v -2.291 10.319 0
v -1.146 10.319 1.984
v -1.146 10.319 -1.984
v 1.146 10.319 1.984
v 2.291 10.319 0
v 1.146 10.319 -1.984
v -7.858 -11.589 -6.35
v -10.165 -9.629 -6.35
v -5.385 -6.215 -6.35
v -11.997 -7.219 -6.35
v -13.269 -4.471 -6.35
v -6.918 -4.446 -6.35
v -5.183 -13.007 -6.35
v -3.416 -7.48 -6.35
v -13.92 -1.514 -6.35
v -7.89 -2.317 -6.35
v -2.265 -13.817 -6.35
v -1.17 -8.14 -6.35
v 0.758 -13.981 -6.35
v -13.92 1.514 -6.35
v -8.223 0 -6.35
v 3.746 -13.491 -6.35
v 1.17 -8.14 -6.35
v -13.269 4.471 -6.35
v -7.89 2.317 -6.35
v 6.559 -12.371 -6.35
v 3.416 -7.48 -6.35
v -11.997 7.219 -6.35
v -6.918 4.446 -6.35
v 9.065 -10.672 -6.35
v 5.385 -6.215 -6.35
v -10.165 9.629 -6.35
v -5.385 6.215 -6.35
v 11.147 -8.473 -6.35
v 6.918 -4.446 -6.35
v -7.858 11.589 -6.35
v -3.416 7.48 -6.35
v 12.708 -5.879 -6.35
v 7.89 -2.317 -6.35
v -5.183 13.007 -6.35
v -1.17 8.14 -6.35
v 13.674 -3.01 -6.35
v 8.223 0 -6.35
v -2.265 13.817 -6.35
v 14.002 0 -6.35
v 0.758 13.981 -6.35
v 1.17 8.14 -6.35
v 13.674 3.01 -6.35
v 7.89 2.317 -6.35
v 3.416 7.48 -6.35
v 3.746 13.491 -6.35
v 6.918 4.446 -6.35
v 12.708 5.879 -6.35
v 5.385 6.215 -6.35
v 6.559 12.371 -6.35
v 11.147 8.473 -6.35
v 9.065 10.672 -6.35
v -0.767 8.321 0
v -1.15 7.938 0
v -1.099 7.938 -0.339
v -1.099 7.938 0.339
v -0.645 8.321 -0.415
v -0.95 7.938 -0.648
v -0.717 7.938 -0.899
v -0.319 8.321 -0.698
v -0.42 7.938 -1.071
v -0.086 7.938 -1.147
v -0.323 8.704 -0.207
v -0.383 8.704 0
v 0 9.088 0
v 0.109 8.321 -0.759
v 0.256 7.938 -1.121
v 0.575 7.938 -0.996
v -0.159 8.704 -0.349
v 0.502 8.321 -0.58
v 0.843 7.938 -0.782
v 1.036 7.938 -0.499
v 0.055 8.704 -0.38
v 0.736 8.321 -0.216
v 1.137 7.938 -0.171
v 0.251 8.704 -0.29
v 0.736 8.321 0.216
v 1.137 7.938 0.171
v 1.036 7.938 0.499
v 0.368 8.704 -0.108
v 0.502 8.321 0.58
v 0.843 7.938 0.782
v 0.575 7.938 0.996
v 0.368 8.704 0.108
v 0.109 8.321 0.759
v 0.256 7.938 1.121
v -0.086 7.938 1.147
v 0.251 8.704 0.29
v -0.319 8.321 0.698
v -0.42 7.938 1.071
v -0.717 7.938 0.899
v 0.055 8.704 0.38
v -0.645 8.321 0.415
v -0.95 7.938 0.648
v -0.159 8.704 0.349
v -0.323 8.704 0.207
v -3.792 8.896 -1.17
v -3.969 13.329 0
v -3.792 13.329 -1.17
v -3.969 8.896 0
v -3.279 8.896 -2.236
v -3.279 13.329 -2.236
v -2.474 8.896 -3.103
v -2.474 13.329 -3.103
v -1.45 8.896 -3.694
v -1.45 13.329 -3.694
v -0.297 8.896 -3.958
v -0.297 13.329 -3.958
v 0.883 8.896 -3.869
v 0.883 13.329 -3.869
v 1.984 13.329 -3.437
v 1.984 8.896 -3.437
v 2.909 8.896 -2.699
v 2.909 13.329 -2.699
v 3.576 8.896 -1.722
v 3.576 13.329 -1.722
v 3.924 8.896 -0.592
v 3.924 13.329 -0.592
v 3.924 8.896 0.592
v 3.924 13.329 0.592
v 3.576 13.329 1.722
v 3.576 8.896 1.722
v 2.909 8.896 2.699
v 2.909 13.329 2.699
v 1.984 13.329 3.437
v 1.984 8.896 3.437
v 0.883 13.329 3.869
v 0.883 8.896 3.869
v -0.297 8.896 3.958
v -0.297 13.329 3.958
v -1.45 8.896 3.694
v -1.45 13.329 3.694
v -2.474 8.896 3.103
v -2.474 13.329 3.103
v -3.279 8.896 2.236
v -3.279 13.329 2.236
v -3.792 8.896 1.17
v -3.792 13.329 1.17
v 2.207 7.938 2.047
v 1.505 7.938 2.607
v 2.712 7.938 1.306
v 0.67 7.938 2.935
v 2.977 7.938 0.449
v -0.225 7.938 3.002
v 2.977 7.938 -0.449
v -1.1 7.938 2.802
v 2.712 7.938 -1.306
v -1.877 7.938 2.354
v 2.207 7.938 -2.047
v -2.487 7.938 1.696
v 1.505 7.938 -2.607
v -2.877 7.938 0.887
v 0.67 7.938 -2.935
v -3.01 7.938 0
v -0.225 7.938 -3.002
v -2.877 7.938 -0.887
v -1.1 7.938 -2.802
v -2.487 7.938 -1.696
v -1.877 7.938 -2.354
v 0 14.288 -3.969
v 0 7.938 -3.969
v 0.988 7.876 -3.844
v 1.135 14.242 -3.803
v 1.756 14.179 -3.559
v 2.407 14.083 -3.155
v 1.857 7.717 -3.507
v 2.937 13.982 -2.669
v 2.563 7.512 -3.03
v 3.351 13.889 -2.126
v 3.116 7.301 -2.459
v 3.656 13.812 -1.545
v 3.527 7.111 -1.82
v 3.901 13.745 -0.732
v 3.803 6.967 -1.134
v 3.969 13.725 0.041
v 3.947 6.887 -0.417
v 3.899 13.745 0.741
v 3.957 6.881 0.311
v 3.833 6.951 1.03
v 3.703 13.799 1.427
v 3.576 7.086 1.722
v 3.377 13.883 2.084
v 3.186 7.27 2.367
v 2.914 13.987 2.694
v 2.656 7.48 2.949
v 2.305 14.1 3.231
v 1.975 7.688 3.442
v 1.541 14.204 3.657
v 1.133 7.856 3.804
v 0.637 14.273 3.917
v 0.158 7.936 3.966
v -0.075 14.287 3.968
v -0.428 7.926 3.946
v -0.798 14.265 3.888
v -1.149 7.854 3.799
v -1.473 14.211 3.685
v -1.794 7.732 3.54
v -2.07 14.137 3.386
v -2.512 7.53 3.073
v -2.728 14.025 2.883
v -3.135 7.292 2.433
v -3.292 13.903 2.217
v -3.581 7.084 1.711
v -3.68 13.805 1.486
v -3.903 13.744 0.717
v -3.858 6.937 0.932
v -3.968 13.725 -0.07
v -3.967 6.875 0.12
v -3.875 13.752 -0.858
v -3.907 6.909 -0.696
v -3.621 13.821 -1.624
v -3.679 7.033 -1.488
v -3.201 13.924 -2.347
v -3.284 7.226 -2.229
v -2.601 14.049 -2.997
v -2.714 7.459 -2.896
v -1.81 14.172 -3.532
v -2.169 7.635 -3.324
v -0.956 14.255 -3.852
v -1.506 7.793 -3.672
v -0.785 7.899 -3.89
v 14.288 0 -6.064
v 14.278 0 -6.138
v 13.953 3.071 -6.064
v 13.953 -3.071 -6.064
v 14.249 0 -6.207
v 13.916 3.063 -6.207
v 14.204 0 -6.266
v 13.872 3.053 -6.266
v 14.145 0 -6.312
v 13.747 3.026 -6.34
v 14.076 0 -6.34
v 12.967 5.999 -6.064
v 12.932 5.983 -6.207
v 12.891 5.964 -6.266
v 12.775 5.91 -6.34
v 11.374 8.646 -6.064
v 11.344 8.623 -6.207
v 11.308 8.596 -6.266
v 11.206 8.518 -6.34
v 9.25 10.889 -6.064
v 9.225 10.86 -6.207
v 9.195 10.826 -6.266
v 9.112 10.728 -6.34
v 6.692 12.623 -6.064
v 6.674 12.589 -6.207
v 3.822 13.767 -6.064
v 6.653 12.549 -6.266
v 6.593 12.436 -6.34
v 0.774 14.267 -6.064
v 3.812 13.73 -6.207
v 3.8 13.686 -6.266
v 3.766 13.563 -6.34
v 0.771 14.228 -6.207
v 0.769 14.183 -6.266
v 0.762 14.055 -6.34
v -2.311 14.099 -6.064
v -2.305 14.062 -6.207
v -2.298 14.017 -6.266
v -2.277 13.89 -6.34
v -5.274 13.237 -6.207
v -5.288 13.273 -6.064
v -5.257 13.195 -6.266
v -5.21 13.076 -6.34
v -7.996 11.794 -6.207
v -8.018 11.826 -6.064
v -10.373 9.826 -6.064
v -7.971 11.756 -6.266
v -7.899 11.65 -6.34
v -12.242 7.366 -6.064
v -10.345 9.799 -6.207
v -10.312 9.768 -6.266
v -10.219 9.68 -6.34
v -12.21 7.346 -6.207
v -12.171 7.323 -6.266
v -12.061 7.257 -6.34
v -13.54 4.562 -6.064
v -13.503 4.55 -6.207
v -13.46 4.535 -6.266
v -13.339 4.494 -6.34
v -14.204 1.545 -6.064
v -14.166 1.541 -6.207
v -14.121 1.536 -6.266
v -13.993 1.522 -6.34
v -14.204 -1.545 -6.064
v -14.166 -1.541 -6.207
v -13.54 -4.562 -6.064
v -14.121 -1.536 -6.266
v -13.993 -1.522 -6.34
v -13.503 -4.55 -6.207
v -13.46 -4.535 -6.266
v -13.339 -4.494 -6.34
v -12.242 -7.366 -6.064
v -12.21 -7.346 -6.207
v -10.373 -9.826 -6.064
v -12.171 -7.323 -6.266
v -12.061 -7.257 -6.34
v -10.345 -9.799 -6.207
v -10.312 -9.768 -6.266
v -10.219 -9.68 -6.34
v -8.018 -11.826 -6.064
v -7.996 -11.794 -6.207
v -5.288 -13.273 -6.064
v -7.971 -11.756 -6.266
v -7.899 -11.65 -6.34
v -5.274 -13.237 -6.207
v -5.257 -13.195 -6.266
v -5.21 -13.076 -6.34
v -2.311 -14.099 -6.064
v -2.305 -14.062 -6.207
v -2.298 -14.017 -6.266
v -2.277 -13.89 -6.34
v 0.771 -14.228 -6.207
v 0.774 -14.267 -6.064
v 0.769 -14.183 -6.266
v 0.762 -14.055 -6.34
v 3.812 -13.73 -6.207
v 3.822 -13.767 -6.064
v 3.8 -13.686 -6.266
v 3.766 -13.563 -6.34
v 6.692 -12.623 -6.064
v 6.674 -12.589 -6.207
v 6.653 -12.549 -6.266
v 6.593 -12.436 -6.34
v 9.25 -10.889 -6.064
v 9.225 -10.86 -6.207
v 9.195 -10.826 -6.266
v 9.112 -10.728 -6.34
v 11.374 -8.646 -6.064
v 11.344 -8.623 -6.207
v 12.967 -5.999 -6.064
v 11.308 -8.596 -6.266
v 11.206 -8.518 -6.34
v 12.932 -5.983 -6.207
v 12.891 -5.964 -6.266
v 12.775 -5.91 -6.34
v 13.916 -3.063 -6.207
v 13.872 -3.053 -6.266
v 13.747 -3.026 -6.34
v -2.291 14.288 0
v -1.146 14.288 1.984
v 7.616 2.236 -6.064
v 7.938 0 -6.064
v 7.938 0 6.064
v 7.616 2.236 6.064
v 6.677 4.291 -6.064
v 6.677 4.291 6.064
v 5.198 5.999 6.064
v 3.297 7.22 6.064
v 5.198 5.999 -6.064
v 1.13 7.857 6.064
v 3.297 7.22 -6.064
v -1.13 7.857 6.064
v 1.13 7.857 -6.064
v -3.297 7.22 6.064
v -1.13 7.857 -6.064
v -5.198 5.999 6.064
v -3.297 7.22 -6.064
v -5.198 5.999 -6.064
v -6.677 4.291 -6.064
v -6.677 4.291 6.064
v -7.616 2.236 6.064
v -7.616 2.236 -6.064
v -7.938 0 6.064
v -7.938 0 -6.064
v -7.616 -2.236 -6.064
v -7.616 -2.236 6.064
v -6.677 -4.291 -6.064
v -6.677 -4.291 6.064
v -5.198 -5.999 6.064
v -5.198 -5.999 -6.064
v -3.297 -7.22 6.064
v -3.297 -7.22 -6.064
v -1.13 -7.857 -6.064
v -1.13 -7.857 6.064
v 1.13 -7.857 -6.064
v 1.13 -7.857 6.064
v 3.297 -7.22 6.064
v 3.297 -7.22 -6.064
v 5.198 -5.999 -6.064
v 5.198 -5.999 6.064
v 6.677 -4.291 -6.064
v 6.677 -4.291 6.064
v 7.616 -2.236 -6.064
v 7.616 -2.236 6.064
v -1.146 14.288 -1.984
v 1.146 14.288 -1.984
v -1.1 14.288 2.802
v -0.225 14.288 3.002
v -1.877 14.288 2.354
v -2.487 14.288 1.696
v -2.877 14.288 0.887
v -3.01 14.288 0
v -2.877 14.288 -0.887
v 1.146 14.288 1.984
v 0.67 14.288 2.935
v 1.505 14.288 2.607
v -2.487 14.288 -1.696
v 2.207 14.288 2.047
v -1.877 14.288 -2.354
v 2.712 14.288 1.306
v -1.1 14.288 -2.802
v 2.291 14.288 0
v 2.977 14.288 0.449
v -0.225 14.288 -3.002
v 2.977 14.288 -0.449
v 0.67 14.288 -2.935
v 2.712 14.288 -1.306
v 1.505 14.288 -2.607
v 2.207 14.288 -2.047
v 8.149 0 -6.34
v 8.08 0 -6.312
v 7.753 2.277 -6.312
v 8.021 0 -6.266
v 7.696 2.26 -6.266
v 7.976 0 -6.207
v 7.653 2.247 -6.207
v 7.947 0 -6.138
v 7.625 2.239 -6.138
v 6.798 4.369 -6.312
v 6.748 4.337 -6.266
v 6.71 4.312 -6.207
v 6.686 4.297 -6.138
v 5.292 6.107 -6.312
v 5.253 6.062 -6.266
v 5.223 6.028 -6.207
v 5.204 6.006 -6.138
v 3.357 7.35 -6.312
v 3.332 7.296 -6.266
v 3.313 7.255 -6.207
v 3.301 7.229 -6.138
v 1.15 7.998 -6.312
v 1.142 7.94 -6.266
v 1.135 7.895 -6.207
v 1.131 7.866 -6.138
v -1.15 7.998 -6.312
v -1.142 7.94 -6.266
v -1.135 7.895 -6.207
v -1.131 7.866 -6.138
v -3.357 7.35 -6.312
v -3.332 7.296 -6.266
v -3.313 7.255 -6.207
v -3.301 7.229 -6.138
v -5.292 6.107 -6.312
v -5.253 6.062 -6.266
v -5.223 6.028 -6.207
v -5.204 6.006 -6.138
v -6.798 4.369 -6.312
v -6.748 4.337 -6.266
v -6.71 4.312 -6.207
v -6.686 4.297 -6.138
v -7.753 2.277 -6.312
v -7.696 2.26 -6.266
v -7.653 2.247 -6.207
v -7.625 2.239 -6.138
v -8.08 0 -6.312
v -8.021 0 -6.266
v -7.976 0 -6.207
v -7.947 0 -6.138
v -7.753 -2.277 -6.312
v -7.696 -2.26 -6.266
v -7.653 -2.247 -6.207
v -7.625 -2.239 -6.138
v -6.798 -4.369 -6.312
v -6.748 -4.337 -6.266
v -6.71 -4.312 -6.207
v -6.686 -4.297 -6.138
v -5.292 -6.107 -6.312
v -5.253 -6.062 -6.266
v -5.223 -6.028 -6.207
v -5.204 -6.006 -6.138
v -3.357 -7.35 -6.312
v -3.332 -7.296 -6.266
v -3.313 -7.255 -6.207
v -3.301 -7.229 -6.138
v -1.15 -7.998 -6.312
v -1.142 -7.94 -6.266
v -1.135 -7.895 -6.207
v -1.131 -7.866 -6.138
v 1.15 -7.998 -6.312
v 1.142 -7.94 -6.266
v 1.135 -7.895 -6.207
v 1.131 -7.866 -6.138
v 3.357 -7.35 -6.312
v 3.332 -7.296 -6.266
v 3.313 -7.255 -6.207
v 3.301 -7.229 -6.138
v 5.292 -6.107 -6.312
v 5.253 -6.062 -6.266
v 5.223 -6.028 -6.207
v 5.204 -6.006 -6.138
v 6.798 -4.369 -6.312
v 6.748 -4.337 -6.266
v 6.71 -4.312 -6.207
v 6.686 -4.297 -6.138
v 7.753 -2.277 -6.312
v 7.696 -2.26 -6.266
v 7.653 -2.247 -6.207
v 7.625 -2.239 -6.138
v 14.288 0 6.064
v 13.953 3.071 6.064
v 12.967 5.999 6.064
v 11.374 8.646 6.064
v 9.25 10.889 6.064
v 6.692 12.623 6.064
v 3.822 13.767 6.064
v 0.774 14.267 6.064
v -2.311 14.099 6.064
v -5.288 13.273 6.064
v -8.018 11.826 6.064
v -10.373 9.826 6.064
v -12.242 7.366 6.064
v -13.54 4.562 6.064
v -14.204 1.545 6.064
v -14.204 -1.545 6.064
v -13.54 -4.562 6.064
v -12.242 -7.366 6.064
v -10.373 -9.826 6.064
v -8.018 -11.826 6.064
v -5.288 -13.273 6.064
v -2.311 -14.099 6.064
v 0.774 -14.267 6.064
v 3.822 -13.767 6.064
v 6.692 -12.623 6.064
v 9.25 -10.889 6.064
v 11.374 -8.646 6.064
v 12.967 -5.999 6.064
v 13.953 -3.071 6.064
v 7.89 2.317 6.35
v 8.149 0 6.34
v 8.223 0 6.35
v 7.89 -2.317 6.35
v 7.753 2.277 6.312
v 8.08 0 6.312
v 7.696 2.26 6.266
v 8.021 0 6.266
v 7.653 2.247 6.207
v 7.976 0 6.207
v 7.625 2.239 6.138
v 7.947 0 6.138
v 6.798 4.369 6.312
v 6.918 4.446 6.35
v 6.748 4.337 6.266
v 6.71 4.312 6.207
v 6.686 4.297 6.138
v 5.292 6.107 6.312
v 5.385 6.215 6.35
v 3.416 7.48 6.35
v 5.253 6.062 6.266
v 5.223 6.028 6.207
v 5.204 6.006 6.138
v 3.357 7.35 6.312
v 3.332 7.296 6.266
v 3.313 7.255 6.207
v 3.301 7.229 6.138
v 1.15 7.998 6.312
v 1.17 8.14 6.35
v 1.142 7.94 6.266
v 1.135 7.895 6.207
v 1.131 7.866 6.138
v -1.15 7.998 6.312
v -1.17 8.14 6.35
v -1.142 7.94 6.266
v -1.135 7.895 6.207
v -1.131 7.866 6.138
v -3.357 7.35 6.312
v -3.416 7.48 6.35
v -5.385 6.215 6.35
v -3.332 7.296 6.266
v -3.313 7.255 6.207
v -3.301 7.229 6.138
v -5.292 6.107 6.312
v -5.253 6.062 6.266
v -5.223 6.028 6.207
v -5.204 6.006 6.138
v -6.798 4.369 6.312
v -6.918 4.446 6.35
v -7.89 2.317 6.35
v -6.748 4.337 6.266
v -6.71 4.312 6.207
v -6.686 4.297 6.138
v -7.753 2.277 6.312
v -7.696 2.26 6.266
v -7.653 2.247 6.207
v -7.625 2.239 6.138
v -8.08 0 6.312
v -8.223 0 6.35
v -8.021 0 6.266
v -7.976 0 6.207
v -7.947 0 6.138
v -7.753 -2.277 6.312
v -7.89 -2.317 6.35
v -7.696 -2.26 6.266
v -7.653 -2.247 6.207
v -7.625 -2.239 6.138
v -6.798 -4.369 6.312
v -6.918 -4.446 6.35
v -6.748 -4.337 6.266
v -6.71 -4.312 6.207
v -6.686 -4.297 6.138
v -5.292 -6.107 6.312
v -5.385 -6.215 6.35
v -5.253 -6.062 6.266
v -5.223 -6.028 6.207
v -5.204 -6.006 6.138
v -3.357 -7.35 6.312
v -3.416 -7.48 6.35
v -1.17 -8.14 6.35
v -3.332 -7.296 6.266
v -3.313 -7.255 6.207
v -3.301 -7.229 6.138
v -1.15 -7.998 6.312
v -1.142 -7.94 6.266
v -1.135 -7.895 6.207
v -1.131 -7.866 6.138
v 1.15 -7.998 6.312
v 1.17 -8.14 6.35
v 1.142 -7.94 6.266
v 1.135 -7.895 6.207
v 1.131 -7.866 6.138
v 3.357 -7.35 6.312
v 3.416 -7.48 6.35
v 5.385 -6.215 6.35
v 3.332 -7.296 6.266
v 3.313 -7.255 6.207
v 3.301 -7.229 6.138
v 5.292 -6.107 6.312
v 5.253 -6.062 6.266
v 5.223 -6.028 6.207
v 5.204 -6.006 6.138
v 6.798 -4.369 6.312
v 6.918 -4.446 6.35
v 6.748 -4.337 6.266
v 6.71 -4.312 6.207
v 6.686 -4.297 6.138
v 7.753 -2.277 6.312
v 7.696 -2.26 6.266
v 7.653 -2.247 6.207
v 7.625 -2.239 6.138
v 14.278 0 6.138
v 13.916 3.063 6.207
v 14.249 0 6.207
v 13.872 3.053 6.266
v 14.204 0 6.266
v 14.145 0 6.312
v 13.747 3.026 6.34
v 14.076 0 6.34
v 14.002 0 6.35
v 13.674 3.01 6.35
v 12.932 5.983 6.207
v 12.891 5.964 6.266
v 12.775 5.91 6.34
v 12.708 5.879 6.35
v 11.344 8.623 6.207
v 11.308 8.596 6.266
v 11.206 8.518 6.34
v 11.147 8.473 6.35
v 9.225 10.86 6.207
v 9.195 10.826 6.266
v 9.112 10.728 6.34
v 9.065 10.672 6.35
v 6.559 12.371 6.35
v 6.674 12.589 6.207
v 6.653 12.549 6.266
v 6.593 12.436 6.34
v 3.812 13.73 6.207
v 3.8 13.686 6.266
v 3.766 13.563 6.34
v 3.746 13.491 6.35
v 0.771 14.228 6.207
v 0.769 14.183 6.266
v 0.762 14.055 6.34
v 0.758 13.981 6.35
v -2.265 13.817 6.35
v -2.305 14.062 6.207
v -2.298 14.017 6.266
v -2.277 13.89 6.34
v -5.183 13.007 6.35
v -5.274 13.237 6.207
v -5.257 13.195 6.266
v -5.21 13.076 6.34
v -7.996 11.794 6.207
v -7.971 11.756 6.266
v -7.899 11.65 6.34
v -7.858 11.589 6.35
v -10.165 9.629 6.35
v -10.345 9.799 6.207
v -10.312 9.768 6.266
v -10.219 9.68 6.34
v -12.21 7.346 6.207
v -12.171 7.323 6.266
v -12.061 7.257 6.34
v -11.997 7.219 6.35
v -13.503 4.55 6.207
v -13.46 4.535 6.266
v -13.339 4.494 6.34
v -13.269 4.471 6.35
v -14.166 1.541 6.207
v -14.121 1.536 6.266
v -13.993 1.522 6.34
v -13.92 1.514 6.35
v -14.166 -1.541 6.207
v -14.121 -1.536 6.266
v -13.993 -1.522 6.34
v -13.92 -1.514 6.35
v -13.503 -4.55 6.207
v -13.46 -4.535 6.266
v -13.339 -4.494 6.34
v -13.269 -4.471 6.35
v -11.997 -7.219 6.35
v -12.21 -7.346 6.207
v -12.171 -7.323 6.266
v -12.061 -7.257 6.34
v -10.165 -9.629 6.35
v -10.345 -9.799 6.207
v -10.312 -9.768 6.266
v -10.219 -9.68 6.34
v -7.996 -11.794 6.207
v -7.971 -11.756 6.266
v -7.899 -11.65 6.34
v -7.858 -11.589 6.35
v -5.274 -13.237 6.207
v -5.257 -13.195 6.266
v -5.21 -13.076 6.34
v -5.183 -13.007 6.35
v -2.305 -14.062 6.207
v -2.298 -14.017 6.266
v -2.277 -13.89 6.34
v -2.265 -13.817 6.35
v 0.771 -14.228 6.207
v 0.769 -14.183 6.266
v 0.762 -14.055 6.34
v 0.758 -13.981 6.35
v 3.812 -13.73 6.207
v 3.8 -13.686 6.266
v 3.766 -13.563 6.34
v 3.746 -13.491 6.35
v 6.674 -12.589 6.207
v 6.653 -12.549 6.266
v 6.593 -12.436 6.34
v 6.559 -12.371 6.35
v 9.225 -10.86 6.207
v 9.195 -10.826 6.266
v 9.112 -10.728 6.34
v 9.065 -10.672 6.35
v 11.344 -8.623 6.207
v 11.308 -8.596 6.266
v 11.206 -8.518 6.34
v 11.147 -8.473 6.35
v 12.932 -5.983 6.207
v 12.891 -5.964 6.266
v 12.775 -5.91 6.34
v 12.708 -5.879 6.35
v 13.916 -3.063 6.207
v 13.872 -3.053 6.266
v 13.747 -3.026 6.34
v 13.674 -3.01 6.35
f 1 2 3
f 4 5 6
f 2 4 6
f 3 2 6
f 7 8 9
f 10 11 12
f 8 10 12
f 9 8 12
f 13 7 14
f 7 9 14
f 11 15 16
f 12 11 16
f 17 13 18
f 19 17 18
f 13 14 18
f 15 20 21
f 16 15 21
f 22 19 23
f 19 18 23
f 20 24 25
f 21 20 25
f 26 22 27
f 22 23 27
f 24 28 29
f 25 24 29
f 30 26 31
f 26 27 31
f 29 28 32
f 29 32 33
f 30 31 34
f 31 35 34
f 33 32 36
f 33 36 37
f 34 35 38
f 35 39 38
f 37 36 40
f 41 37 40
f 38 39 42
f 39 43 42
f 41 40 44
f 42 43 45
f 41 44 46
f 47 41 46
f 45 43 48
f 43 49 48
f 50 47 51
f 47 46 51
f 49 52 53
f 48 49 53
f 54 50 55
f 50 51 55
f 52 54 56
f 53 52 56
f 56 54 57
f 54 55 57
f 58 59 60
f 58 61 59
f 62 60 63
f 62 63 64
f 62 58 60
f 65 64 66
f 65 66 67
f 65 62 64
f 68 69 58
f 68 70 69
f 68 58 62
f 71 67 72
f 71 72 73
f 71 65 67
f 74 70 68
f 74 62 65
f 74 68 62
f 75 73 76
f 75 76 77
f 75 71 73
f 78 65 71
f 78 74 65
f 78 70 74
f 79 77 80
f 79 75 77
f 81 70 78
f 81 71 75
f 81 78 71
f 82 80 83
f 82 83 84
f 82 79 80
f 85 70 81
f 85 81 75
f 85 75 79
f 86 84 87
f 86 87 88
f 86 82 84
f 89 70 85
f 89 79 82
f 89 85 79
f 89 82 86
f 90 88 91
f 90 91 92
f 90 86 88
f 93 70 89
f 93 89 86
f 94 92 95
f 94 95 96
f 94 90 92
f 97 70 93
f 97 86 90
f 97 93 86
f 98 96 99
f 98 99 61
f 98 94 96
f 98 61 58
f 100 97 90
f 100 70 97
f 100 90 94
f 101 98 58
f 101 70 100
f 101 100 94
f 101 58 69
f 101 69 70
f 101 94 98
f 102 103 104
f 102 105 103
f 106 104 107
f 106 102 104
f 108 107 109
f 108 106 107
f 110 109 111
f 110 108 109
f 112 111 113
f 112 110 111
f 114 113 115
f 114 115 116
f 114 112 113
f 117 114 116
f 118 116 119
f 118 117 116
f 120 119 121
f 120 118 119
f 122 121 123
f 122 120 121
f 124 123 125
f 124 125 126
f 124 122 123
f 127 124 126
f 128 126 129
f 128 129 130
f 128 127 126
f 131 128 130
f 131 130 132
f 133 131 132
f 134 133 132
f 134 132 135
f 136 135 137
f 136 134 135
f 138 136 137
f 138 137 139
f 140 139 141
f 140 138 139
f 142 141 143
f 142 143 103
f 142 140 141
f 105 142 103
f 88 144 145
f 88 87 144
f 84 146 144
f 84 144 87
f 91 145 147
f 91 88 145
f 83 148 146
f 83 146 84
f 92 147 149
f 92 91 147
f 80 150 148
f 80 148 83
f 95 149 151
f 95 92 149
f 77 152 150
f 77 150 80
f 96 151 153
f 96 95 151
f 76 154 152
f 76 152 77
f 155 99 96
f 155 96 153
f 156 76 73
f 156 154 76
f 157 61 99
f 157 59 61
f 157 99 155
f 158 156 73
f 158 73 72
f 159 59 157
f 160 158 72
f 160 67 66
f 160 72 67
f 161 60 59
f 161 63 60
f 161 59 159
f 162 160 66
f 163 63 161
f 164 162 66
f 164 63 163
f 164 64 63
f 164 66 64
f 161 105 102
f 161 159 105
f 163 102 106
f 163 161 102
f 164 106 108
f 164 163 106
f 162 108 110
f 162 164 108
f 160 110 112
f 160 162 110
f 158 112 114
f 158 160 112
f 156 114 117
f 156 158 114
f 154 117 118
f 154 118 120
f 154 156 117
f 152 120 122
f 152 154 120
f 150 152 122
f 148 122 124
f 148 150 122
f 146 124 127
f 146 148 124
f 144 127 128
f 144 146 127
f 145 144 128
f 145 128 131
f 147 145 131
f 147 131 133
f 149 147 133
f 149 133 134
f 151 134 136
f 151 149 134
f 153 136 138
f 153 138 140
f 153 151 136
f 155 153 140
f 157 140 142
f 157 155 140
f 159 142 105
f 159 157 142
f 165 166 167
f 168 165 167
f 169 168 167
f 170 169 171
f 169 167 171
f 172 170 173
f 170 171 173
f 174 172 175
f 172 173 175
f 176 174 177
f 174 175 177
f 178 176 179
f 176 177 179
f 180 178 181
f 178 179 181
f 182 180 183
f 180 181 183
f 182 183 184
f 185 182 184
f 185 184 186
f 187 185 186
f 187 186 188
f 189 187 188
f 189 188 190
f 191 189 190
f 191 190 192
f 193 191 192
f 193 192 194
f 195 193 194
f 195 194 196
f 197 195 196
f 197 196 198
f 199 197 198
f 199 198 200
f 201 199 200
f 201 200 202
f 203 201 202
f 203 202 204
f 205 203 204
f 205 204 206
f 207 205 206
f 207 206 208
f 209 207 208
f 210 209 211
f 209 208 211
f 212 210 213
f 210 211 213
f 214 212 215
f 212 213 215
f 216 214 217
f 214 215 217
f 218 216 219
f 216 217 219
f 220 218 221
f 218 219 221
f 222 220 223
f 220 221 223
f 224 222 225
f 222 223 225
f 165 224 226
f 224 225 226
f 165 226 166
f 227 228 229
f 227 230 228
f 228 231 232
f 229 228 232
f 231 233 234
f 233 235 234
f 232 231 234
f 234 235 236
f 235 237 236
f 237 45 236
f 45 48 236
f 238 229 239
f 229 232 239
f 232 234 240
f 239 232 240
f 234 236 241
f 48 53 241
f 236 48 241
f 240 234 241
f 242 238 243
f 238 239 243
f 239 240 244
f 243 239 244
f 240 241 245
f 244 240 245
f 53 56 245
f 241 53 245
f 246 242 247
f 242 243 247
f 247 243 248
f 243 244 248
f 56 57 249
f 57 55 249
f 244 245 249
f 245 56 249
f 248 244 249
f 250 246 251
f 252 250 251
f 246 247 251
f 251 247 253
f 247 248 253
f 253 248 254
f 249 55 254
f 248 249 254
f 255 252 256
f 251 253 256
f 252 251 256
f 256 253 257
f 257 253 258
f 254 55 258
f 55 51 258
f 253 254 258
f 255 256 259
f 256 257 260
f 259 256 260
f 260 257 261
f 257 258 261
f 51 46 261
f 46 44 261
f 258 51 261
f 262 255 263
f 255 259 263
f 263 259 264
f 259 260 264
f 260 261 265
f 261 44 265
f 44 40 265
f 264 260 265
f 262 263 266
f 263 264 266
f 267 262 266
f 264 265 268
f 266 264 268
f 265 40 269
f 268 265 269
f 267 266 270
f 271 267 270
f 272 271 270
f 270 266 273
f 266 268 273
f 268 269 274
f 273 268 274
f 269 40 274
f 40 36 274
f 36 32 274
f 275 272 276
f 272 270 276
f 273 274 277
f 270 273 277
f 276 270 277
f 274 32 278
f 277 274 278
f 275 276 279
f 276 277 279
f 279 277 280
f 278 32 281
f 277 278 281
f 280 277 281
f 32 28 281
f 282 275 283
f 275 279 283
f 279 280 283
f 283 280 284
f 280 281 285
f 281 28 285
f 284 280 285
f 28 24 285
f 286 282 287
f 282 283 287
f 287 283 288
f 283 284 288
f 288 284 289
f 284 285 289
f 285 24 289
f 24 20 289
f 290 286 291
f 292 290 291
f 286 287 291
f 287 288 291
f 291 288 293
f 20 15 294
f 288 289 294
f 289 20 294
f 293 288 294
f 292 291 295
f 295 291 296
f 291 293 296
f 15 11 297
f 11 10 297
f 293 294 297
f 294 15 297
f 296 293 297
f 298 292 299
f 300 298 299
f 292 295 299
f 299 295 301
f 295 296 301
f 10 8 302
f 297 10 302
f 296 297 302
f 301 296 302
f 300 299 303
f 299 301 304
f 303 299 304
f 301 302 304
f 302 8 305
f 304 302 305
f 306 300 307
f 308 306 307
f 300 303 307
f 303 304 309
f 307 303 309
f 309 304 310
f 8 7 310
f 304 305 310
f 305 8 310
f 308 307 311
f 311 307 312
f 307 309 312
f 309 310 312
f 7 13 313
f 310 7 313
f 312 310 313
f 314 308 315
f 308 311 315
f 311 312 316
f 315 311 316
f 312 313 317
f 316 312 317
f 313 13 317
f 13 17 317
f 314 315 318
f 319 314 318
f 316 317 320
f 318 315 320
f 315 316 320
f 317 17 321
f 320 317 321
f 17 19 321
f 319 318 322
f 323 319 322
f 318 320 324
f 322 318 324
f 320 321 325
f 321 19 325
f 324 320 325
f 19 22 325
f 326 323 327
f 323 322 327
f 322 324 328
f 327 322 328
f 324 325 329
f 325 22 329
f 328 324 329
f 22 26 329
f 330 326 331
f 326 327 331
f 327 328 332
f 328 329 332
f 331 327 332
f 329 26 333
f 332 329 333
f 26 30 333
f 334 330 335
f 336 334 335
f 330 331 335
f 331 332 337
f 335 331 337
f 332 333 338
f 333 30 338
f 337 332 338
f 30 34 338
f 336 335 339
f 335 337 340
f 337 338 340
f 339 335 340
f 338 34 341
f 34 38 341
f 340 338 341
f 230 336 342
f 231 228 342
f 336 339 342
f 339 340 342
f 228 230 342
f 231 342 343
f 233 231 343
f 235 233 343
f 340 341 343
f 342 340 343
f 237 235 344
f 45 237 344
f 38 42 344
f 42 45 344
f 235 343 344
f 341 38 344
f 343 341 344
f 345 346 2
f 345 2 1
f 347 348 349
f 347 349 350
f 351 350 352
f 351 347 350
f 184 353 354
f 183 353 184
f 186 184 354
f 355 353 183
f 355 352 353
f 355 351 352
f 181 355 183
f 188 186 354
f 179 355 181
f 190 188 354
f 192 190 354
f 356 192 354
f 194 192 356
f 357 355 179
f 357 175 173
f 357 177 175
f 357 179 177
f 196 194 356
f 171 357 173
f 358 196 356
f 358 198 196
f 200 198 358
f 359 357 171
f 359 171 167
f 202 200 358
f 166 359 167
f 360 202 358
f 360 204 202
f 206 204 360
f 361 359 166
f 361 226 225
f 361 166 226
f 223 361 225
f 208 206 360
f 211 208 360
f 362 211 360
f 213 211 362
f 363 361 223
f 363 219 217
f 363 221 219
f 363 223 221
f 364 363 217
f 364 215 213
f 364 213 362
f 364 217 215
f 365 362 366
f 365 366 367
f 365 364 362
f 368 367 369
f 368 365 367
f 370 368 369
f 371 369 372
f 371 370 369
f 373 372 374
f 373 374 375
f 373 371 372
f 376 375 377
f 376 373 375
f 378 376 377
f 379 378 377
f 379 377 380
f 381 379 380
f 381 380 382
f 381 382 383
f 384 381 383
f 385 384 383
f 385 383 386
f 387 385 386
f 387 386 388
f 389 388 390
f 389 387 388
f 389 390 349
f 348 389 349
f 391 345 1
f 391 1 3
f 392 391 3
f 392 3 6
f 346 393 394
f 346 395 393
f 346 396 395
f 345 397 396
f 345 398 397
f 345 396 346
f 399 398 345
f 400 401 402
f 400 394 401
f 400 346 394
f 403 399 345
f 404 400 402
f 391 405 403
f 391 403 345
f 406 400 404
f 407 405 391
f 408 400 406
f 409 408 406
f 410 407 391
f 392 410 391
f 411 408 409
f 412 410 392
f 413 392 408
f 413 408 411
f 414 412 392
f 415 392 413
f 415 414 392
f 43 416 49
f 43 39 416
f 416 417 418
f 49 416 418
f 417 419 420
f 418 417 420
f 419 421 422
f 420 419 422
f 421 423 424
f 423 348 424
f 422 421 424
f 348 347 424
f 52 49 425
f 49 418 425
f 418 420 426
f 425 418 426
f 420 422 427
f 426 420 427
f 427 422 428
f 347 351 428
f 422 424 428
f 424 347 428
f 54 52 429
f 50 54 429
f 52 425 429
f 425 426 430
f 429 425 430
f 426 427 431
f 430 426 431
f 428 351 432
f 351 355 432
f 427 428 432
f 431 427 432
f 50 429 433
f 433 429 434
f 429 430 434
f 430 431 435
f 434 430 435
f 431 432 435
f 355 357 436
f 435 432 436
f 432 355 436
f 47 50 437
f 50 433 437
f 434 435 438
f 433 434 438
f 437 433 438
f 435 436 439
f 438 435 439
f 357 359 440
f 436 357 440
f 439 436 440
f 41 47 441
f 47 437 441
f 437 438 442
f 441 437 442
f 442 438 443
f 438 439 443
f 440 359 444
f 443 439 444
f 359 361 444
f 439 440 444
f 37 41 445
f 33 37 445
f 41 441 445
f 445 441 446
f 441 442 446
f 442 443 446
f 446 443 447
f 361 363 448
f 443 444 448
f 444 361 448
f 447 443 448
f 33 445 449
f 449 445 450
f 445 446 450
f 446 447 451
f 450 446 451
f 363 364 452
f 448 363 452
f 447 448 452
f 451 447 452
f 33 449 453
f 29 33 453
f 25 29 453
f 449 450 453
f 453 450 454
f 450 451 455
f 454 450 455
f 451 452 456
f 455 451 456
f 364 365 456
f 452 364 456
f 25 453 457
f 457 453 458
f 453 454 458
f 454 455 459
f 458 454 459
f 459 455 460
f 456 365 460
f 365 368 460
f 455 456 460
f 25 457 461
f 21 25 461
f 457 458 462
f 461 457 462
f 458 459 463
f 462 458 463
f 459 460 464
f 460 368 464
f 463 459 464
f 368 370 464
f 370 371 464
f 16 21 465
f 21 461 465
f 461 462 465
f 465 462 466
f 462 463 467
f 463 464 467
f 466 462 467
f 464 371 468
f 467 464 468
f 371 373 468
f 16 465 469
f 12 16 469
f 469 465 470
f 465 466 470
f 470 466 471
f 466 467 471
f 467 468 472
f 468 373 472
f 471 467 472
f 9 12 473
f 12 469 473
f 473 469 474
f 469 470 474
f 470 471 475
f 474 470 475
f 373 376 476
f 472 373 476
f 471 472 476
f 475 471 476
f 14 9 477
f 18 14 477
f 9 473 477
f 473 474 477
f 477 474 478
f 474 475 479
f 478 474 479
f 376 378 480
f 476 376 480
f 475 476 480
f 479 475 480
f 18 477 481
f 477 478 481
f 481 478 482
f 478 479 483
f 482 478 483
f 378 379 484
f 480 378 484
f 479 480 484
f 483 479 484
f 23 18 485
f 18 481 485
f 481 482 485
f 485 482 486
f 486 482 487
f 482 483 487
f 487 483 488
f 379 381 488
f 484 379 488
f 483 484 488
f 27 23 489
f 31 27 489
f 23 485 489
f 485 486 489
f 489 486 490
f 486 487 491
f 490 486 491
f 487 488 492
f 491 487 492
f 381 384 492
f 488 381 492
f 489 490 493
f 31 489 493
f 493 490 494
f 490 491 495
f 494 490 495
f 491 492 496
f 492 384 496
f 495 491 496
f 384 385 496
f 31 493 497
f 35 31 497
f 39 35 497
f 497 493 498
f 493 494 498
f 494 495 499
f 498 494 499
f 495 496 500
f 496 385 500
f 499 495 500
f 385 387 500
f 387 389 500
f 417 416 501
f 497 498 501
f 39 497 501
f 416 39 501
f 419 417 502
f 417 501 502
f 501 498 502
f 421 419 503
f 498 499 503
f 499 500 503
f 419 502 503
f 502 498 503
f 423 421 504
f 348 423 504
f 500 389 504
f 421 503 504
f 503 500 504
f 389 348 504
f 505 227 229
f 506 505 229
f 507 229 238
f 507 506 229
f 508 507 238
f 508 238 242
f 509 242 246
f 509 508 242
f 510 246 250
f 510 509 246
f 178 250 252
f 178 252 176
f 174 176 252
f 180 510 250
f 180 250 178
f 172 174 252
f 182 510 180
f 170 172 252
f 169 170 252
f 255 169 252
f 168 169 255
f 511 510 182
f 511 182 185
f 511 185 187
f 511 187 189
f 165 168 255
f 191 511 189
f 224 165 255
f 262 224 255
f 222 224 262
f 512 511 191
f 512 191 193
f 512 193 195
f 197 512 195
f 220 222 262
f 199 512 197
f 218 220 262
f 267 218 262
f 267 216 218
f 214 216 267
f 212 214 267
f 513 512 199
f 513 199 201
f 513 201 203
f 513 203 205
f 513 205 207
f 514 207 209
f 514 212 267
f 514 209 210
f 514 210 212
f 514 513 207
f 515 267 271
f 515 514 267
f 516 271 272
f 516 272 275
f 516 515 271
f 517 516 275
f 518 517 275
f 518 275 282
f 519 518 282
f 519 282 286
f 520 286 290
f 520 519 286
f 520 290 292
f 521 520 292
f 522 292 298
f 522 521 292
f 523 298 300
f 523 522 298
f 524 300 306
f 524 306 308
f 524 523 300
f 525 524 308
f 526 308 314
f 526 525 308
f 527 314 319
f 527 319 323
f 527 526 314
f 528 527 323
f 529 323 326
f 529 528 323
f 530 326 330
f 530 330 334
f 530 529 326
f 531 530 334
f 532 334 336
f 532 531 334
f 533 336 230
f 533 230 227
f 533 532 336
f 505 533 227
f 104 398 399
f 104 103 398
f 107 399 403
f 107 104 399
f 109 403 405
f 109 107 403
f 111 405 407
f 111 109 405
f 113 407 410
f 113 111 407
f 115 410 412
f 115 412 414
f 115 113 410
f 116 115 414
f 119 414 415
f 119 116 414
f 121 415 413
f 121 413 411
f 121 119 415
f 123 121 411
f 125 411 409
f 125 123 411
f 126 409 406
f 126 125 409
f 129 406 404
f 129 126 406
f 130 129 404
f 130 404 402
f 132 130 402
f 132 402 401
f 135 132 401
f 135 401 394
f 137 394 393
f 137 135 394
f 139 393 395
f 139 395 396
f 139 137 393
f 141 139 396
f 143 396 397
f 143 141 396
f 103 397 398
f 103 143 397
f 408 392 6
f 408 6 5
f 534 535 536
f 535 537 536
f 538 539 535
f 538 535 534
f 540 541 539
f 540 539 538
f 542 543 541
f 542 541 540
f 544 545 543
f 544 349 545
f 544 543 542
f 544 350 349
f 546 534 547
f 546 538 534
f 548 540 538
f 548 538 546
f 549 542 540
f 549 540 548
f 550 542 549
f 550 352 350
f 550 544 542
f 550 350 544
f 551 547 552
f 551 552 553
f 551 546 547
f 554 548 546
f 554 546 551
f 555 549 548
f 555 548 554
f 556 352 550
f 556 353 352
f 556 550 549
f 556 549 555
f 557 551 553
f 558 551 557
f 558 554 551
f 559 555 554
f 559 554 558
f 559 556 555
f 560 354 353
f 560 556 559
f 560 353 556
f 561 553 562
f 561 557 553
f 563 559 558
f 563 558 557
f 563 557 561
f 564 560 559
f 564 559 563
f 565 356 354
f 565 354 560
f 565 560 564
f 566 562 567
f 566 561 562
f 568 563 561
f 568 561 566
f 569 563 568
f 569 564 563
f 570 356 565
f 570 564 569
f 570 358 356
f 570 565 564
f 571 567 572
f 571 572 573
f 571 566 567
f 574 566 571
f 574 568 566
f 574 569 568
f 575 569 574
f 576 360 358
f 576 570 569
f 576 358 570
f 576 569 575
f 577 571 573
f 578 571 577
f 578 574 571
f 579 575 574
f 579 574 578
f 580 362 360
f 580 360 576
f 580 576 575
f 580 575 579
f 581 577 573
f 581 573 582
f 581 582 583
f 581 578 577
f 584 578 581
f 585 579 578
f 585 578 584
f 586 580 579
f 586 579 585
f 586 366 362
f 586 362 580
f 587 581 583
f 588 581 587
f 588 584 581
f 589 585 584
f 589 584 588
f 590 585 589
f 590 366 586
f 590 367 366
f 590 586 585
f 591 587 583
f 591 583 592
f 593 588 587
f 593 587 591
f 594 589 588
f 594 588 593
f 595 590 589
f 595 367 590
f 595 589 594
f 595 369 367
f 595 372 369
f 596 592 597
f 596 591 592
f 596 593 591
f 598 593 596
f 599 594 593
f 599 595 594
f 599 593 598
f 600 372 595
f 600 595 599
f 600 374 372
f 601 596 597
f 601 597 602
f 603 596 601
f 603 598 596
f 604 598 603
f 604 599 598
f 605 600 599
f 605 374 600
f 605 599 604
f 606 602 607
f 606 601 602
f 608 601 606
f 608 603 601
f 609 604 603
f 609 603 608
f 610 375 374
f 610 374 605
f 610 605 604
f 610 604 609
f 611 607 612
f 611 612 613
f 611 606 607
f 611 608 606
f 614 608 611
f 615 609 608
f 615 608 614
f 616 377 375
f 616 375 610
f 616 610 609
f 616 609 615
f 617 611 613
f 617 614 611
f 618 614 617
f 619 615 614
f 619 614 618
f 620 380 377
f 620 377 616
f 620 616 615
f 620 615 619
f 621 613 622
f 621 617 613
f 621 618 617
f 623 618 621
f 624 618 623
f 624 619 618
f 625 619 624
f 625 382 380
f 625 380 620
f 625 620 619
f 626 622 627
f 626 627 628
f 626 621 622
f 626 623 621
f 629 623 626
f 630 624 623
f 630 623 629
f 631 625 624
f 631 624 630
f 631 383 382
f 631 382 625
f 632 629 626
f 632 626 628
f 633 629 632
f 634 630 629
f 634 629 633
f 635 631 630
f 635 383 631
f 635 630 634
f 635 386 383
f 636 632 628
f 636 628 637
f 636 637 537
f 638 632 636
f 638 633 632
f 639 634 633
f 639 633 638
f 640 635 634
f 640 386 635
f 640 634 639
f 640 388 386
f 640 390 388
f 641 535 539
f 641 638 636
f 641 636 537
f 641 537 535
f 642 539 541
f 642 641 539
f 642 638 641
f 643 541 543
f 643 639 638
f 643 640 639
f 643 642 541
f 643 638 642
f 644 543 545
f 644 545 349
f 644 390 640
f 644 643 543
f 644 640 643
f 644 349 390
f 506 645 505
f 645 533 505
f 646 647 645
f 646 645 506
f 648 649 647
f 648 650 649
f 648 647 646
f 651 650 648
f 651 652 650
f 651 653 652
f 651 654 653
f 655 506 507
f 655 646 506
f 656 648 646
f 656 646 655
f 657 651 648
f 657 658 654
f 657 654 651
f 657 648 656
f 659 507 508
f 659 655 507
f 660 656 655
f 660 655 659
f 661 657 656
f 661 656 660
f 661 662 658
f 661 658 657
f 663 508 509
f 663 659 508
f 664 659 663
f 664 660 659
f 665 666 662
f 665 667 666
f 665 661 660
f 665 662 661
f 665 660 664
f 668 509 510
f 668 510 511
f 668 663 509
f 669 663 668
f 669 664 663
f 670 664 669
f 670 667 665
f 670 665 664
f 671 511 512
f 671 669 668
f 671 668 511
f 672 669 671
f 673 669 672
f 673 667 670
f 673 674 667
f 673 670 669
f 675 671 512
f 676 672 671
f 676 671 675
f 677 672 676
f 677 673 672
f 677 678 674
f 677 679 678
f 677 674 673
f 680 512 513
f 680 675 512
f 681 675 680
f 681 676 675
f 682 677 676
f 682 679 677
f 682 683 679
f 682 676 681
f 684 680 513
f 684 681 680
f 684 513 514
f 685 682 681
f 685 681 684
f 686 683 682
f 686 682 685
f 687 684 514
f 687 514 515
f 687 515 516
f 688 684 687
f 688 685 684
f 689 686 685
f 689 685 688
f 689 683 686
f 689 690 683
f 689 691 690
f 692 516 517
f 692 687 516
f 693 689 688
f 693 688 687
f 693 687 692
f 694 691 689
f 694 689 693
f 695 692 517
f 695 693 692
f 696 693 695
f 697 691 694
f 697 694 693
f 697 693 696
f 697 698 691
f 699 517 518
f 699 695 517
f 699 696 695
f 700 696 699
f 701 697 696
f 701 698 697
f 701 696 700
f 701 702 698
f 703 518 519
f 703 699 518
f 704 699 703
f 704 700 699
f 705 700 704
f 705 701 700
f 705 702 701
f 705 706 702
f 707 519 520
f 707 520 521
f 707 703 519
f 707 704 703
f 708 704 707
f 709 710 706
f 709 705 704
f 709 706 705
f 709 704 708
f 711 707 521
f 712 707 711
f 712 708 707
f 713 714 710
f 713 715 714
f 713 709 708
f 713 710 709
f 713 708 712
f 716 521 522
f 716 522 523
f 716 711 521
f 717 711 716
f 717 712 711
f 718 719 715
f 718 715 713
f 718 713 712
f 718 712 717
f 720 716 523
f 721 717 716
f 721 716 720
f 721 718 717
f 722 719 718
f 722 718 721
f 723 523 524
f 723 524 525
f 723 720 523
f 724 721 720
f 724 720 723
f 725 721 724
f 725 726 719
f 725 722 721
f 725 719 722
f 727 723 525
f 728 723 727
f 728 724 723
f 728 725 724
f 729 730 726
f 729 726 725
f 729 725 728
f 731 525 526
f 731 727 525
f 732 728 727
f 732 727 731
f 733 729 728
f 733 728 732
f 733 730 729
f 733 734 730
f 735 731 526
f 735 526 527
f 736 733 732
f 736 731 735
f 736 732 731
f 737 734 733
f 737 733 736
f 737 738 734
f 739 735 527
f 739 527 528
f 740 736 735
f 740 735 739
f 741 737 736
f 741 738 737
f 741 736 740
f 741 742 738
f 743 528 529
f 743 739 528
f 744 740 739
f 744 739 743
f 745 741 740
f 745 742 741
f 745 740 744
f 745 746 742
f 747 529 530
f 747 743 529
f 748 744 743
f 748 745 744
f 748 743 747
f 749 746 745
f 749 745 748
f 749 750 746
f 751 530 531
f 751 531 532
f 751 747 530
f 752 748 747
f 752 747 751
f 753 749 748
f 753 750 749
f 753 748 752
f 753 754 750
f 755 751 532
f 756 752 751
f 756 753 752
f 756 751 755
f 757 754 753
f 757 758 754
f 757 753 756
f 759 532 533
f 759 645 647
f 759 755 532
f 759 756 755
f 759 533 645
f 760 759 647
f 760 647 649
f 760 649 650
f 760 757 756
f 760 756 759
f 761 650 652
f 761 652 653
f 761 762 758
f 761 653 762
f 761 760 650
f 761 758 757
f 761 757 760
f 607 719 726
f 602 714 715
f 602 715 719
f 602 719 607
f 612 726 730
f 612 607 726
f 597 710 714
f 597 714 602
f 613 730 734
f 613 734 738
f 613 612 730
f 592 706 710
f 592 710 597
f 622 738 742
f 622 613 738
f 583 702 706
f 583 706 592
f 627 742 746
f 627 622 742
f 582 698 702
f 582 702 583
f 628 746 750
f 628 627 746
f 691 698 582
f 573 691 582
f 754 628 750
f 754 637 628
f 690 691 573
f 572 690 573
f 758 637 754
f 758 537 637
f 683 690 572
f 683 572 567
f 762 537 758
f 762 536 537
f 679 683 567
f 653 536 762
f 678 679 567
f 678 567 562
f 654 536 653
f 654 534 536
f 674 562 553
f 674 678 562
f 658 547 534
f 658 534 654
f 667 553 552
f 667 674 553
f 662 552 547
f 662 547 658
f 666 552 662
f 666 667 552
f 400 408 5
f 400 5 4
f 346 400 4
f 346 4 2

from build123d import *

# Parameters (mm, degrees)
SKETCH1_R          = 14.2875
SKETCH1_R_2        = 7.9375
EXTRUDE1_DEPTH     = 6.35
SKETCH2_R          = 3.96875
CUT_EXTRUDE1_DEPTH = 15.2875
FILLET1_R          = 0.28575
CUT_EXTRUDE2_DEPTH = 3.96875


with BuildPart() as part:
    # Sketch1 → Extrude1 (new body, symmetric)
    with BuildSketch(Plane.XY):
        Circle(SKETCH1_R)
        Circle(SKETCH1_R_2, mode=Mode.SUBTRACT)
    extrude(amount=EXTRUDE1_DEPTH, both=True)

    # Sketch2 → Cut-Extrude1 (cut, through all)
    with BuildSketch(Plane(origin=(41.275, 0, 0), x_dir=(0, 0, -1), z_dir=(0, -1, 0))):
        with Locations((0, -41.275)):
            Circle(SKETCH2_R)
    extrude(amount=-CUT_EXTRUDE1_DEPTH, mode=Mode.SUBTRACT)

    # Fillet1
    fillet1_edges = [part.edges().sort_by_distance(p)[0] for p in [
        (-14.2875, 0, -6.35),
        (-14.2875, 0, 6.35),
        (-7.9375, 0, -6.35),
        (-7.9375, 0, 6.35),
    ]]
    fillet(fillet1_edges, radius=FILLET1_R)


with BuildPart() as body_2:
    # Sketch3 → Revolve1 (revolve)
    with BuildSketch(Plane.XY):
        Polygon((-3.010240789, 7.9375), (-1.150211053, 7.9375), (0, 9.087711053), (0, 14.2875), (-3.010240789, 14.2875), (-3.96875, 13.328990789), (-3.96875, 8.896009211), align=None)
    revolve(axis=Axis((0, 7.9375, 0), (0, -1, 0)))

    # Sketch4 → Cut-Extrude2 (cut)
    with BuildSketch(Plane(origin=(3.3734375, 14.2875, 0), x_dir=(0, 0, -1), z_dir=(0, -1, 0))):
        Polygon((0, -1.082078619), (-1.984375, -2.22775806), (-1.984375, -4.51911694), (0, -5.664796381), (1.984375, -4.51911694), (1.984375, -2.22775806), align=None)
    extrude(amount=CUT_EXTRUDE2_DEPTH, mode=Mode.SUBTRACT)


solid = Compound([part.part, body_2.part])
